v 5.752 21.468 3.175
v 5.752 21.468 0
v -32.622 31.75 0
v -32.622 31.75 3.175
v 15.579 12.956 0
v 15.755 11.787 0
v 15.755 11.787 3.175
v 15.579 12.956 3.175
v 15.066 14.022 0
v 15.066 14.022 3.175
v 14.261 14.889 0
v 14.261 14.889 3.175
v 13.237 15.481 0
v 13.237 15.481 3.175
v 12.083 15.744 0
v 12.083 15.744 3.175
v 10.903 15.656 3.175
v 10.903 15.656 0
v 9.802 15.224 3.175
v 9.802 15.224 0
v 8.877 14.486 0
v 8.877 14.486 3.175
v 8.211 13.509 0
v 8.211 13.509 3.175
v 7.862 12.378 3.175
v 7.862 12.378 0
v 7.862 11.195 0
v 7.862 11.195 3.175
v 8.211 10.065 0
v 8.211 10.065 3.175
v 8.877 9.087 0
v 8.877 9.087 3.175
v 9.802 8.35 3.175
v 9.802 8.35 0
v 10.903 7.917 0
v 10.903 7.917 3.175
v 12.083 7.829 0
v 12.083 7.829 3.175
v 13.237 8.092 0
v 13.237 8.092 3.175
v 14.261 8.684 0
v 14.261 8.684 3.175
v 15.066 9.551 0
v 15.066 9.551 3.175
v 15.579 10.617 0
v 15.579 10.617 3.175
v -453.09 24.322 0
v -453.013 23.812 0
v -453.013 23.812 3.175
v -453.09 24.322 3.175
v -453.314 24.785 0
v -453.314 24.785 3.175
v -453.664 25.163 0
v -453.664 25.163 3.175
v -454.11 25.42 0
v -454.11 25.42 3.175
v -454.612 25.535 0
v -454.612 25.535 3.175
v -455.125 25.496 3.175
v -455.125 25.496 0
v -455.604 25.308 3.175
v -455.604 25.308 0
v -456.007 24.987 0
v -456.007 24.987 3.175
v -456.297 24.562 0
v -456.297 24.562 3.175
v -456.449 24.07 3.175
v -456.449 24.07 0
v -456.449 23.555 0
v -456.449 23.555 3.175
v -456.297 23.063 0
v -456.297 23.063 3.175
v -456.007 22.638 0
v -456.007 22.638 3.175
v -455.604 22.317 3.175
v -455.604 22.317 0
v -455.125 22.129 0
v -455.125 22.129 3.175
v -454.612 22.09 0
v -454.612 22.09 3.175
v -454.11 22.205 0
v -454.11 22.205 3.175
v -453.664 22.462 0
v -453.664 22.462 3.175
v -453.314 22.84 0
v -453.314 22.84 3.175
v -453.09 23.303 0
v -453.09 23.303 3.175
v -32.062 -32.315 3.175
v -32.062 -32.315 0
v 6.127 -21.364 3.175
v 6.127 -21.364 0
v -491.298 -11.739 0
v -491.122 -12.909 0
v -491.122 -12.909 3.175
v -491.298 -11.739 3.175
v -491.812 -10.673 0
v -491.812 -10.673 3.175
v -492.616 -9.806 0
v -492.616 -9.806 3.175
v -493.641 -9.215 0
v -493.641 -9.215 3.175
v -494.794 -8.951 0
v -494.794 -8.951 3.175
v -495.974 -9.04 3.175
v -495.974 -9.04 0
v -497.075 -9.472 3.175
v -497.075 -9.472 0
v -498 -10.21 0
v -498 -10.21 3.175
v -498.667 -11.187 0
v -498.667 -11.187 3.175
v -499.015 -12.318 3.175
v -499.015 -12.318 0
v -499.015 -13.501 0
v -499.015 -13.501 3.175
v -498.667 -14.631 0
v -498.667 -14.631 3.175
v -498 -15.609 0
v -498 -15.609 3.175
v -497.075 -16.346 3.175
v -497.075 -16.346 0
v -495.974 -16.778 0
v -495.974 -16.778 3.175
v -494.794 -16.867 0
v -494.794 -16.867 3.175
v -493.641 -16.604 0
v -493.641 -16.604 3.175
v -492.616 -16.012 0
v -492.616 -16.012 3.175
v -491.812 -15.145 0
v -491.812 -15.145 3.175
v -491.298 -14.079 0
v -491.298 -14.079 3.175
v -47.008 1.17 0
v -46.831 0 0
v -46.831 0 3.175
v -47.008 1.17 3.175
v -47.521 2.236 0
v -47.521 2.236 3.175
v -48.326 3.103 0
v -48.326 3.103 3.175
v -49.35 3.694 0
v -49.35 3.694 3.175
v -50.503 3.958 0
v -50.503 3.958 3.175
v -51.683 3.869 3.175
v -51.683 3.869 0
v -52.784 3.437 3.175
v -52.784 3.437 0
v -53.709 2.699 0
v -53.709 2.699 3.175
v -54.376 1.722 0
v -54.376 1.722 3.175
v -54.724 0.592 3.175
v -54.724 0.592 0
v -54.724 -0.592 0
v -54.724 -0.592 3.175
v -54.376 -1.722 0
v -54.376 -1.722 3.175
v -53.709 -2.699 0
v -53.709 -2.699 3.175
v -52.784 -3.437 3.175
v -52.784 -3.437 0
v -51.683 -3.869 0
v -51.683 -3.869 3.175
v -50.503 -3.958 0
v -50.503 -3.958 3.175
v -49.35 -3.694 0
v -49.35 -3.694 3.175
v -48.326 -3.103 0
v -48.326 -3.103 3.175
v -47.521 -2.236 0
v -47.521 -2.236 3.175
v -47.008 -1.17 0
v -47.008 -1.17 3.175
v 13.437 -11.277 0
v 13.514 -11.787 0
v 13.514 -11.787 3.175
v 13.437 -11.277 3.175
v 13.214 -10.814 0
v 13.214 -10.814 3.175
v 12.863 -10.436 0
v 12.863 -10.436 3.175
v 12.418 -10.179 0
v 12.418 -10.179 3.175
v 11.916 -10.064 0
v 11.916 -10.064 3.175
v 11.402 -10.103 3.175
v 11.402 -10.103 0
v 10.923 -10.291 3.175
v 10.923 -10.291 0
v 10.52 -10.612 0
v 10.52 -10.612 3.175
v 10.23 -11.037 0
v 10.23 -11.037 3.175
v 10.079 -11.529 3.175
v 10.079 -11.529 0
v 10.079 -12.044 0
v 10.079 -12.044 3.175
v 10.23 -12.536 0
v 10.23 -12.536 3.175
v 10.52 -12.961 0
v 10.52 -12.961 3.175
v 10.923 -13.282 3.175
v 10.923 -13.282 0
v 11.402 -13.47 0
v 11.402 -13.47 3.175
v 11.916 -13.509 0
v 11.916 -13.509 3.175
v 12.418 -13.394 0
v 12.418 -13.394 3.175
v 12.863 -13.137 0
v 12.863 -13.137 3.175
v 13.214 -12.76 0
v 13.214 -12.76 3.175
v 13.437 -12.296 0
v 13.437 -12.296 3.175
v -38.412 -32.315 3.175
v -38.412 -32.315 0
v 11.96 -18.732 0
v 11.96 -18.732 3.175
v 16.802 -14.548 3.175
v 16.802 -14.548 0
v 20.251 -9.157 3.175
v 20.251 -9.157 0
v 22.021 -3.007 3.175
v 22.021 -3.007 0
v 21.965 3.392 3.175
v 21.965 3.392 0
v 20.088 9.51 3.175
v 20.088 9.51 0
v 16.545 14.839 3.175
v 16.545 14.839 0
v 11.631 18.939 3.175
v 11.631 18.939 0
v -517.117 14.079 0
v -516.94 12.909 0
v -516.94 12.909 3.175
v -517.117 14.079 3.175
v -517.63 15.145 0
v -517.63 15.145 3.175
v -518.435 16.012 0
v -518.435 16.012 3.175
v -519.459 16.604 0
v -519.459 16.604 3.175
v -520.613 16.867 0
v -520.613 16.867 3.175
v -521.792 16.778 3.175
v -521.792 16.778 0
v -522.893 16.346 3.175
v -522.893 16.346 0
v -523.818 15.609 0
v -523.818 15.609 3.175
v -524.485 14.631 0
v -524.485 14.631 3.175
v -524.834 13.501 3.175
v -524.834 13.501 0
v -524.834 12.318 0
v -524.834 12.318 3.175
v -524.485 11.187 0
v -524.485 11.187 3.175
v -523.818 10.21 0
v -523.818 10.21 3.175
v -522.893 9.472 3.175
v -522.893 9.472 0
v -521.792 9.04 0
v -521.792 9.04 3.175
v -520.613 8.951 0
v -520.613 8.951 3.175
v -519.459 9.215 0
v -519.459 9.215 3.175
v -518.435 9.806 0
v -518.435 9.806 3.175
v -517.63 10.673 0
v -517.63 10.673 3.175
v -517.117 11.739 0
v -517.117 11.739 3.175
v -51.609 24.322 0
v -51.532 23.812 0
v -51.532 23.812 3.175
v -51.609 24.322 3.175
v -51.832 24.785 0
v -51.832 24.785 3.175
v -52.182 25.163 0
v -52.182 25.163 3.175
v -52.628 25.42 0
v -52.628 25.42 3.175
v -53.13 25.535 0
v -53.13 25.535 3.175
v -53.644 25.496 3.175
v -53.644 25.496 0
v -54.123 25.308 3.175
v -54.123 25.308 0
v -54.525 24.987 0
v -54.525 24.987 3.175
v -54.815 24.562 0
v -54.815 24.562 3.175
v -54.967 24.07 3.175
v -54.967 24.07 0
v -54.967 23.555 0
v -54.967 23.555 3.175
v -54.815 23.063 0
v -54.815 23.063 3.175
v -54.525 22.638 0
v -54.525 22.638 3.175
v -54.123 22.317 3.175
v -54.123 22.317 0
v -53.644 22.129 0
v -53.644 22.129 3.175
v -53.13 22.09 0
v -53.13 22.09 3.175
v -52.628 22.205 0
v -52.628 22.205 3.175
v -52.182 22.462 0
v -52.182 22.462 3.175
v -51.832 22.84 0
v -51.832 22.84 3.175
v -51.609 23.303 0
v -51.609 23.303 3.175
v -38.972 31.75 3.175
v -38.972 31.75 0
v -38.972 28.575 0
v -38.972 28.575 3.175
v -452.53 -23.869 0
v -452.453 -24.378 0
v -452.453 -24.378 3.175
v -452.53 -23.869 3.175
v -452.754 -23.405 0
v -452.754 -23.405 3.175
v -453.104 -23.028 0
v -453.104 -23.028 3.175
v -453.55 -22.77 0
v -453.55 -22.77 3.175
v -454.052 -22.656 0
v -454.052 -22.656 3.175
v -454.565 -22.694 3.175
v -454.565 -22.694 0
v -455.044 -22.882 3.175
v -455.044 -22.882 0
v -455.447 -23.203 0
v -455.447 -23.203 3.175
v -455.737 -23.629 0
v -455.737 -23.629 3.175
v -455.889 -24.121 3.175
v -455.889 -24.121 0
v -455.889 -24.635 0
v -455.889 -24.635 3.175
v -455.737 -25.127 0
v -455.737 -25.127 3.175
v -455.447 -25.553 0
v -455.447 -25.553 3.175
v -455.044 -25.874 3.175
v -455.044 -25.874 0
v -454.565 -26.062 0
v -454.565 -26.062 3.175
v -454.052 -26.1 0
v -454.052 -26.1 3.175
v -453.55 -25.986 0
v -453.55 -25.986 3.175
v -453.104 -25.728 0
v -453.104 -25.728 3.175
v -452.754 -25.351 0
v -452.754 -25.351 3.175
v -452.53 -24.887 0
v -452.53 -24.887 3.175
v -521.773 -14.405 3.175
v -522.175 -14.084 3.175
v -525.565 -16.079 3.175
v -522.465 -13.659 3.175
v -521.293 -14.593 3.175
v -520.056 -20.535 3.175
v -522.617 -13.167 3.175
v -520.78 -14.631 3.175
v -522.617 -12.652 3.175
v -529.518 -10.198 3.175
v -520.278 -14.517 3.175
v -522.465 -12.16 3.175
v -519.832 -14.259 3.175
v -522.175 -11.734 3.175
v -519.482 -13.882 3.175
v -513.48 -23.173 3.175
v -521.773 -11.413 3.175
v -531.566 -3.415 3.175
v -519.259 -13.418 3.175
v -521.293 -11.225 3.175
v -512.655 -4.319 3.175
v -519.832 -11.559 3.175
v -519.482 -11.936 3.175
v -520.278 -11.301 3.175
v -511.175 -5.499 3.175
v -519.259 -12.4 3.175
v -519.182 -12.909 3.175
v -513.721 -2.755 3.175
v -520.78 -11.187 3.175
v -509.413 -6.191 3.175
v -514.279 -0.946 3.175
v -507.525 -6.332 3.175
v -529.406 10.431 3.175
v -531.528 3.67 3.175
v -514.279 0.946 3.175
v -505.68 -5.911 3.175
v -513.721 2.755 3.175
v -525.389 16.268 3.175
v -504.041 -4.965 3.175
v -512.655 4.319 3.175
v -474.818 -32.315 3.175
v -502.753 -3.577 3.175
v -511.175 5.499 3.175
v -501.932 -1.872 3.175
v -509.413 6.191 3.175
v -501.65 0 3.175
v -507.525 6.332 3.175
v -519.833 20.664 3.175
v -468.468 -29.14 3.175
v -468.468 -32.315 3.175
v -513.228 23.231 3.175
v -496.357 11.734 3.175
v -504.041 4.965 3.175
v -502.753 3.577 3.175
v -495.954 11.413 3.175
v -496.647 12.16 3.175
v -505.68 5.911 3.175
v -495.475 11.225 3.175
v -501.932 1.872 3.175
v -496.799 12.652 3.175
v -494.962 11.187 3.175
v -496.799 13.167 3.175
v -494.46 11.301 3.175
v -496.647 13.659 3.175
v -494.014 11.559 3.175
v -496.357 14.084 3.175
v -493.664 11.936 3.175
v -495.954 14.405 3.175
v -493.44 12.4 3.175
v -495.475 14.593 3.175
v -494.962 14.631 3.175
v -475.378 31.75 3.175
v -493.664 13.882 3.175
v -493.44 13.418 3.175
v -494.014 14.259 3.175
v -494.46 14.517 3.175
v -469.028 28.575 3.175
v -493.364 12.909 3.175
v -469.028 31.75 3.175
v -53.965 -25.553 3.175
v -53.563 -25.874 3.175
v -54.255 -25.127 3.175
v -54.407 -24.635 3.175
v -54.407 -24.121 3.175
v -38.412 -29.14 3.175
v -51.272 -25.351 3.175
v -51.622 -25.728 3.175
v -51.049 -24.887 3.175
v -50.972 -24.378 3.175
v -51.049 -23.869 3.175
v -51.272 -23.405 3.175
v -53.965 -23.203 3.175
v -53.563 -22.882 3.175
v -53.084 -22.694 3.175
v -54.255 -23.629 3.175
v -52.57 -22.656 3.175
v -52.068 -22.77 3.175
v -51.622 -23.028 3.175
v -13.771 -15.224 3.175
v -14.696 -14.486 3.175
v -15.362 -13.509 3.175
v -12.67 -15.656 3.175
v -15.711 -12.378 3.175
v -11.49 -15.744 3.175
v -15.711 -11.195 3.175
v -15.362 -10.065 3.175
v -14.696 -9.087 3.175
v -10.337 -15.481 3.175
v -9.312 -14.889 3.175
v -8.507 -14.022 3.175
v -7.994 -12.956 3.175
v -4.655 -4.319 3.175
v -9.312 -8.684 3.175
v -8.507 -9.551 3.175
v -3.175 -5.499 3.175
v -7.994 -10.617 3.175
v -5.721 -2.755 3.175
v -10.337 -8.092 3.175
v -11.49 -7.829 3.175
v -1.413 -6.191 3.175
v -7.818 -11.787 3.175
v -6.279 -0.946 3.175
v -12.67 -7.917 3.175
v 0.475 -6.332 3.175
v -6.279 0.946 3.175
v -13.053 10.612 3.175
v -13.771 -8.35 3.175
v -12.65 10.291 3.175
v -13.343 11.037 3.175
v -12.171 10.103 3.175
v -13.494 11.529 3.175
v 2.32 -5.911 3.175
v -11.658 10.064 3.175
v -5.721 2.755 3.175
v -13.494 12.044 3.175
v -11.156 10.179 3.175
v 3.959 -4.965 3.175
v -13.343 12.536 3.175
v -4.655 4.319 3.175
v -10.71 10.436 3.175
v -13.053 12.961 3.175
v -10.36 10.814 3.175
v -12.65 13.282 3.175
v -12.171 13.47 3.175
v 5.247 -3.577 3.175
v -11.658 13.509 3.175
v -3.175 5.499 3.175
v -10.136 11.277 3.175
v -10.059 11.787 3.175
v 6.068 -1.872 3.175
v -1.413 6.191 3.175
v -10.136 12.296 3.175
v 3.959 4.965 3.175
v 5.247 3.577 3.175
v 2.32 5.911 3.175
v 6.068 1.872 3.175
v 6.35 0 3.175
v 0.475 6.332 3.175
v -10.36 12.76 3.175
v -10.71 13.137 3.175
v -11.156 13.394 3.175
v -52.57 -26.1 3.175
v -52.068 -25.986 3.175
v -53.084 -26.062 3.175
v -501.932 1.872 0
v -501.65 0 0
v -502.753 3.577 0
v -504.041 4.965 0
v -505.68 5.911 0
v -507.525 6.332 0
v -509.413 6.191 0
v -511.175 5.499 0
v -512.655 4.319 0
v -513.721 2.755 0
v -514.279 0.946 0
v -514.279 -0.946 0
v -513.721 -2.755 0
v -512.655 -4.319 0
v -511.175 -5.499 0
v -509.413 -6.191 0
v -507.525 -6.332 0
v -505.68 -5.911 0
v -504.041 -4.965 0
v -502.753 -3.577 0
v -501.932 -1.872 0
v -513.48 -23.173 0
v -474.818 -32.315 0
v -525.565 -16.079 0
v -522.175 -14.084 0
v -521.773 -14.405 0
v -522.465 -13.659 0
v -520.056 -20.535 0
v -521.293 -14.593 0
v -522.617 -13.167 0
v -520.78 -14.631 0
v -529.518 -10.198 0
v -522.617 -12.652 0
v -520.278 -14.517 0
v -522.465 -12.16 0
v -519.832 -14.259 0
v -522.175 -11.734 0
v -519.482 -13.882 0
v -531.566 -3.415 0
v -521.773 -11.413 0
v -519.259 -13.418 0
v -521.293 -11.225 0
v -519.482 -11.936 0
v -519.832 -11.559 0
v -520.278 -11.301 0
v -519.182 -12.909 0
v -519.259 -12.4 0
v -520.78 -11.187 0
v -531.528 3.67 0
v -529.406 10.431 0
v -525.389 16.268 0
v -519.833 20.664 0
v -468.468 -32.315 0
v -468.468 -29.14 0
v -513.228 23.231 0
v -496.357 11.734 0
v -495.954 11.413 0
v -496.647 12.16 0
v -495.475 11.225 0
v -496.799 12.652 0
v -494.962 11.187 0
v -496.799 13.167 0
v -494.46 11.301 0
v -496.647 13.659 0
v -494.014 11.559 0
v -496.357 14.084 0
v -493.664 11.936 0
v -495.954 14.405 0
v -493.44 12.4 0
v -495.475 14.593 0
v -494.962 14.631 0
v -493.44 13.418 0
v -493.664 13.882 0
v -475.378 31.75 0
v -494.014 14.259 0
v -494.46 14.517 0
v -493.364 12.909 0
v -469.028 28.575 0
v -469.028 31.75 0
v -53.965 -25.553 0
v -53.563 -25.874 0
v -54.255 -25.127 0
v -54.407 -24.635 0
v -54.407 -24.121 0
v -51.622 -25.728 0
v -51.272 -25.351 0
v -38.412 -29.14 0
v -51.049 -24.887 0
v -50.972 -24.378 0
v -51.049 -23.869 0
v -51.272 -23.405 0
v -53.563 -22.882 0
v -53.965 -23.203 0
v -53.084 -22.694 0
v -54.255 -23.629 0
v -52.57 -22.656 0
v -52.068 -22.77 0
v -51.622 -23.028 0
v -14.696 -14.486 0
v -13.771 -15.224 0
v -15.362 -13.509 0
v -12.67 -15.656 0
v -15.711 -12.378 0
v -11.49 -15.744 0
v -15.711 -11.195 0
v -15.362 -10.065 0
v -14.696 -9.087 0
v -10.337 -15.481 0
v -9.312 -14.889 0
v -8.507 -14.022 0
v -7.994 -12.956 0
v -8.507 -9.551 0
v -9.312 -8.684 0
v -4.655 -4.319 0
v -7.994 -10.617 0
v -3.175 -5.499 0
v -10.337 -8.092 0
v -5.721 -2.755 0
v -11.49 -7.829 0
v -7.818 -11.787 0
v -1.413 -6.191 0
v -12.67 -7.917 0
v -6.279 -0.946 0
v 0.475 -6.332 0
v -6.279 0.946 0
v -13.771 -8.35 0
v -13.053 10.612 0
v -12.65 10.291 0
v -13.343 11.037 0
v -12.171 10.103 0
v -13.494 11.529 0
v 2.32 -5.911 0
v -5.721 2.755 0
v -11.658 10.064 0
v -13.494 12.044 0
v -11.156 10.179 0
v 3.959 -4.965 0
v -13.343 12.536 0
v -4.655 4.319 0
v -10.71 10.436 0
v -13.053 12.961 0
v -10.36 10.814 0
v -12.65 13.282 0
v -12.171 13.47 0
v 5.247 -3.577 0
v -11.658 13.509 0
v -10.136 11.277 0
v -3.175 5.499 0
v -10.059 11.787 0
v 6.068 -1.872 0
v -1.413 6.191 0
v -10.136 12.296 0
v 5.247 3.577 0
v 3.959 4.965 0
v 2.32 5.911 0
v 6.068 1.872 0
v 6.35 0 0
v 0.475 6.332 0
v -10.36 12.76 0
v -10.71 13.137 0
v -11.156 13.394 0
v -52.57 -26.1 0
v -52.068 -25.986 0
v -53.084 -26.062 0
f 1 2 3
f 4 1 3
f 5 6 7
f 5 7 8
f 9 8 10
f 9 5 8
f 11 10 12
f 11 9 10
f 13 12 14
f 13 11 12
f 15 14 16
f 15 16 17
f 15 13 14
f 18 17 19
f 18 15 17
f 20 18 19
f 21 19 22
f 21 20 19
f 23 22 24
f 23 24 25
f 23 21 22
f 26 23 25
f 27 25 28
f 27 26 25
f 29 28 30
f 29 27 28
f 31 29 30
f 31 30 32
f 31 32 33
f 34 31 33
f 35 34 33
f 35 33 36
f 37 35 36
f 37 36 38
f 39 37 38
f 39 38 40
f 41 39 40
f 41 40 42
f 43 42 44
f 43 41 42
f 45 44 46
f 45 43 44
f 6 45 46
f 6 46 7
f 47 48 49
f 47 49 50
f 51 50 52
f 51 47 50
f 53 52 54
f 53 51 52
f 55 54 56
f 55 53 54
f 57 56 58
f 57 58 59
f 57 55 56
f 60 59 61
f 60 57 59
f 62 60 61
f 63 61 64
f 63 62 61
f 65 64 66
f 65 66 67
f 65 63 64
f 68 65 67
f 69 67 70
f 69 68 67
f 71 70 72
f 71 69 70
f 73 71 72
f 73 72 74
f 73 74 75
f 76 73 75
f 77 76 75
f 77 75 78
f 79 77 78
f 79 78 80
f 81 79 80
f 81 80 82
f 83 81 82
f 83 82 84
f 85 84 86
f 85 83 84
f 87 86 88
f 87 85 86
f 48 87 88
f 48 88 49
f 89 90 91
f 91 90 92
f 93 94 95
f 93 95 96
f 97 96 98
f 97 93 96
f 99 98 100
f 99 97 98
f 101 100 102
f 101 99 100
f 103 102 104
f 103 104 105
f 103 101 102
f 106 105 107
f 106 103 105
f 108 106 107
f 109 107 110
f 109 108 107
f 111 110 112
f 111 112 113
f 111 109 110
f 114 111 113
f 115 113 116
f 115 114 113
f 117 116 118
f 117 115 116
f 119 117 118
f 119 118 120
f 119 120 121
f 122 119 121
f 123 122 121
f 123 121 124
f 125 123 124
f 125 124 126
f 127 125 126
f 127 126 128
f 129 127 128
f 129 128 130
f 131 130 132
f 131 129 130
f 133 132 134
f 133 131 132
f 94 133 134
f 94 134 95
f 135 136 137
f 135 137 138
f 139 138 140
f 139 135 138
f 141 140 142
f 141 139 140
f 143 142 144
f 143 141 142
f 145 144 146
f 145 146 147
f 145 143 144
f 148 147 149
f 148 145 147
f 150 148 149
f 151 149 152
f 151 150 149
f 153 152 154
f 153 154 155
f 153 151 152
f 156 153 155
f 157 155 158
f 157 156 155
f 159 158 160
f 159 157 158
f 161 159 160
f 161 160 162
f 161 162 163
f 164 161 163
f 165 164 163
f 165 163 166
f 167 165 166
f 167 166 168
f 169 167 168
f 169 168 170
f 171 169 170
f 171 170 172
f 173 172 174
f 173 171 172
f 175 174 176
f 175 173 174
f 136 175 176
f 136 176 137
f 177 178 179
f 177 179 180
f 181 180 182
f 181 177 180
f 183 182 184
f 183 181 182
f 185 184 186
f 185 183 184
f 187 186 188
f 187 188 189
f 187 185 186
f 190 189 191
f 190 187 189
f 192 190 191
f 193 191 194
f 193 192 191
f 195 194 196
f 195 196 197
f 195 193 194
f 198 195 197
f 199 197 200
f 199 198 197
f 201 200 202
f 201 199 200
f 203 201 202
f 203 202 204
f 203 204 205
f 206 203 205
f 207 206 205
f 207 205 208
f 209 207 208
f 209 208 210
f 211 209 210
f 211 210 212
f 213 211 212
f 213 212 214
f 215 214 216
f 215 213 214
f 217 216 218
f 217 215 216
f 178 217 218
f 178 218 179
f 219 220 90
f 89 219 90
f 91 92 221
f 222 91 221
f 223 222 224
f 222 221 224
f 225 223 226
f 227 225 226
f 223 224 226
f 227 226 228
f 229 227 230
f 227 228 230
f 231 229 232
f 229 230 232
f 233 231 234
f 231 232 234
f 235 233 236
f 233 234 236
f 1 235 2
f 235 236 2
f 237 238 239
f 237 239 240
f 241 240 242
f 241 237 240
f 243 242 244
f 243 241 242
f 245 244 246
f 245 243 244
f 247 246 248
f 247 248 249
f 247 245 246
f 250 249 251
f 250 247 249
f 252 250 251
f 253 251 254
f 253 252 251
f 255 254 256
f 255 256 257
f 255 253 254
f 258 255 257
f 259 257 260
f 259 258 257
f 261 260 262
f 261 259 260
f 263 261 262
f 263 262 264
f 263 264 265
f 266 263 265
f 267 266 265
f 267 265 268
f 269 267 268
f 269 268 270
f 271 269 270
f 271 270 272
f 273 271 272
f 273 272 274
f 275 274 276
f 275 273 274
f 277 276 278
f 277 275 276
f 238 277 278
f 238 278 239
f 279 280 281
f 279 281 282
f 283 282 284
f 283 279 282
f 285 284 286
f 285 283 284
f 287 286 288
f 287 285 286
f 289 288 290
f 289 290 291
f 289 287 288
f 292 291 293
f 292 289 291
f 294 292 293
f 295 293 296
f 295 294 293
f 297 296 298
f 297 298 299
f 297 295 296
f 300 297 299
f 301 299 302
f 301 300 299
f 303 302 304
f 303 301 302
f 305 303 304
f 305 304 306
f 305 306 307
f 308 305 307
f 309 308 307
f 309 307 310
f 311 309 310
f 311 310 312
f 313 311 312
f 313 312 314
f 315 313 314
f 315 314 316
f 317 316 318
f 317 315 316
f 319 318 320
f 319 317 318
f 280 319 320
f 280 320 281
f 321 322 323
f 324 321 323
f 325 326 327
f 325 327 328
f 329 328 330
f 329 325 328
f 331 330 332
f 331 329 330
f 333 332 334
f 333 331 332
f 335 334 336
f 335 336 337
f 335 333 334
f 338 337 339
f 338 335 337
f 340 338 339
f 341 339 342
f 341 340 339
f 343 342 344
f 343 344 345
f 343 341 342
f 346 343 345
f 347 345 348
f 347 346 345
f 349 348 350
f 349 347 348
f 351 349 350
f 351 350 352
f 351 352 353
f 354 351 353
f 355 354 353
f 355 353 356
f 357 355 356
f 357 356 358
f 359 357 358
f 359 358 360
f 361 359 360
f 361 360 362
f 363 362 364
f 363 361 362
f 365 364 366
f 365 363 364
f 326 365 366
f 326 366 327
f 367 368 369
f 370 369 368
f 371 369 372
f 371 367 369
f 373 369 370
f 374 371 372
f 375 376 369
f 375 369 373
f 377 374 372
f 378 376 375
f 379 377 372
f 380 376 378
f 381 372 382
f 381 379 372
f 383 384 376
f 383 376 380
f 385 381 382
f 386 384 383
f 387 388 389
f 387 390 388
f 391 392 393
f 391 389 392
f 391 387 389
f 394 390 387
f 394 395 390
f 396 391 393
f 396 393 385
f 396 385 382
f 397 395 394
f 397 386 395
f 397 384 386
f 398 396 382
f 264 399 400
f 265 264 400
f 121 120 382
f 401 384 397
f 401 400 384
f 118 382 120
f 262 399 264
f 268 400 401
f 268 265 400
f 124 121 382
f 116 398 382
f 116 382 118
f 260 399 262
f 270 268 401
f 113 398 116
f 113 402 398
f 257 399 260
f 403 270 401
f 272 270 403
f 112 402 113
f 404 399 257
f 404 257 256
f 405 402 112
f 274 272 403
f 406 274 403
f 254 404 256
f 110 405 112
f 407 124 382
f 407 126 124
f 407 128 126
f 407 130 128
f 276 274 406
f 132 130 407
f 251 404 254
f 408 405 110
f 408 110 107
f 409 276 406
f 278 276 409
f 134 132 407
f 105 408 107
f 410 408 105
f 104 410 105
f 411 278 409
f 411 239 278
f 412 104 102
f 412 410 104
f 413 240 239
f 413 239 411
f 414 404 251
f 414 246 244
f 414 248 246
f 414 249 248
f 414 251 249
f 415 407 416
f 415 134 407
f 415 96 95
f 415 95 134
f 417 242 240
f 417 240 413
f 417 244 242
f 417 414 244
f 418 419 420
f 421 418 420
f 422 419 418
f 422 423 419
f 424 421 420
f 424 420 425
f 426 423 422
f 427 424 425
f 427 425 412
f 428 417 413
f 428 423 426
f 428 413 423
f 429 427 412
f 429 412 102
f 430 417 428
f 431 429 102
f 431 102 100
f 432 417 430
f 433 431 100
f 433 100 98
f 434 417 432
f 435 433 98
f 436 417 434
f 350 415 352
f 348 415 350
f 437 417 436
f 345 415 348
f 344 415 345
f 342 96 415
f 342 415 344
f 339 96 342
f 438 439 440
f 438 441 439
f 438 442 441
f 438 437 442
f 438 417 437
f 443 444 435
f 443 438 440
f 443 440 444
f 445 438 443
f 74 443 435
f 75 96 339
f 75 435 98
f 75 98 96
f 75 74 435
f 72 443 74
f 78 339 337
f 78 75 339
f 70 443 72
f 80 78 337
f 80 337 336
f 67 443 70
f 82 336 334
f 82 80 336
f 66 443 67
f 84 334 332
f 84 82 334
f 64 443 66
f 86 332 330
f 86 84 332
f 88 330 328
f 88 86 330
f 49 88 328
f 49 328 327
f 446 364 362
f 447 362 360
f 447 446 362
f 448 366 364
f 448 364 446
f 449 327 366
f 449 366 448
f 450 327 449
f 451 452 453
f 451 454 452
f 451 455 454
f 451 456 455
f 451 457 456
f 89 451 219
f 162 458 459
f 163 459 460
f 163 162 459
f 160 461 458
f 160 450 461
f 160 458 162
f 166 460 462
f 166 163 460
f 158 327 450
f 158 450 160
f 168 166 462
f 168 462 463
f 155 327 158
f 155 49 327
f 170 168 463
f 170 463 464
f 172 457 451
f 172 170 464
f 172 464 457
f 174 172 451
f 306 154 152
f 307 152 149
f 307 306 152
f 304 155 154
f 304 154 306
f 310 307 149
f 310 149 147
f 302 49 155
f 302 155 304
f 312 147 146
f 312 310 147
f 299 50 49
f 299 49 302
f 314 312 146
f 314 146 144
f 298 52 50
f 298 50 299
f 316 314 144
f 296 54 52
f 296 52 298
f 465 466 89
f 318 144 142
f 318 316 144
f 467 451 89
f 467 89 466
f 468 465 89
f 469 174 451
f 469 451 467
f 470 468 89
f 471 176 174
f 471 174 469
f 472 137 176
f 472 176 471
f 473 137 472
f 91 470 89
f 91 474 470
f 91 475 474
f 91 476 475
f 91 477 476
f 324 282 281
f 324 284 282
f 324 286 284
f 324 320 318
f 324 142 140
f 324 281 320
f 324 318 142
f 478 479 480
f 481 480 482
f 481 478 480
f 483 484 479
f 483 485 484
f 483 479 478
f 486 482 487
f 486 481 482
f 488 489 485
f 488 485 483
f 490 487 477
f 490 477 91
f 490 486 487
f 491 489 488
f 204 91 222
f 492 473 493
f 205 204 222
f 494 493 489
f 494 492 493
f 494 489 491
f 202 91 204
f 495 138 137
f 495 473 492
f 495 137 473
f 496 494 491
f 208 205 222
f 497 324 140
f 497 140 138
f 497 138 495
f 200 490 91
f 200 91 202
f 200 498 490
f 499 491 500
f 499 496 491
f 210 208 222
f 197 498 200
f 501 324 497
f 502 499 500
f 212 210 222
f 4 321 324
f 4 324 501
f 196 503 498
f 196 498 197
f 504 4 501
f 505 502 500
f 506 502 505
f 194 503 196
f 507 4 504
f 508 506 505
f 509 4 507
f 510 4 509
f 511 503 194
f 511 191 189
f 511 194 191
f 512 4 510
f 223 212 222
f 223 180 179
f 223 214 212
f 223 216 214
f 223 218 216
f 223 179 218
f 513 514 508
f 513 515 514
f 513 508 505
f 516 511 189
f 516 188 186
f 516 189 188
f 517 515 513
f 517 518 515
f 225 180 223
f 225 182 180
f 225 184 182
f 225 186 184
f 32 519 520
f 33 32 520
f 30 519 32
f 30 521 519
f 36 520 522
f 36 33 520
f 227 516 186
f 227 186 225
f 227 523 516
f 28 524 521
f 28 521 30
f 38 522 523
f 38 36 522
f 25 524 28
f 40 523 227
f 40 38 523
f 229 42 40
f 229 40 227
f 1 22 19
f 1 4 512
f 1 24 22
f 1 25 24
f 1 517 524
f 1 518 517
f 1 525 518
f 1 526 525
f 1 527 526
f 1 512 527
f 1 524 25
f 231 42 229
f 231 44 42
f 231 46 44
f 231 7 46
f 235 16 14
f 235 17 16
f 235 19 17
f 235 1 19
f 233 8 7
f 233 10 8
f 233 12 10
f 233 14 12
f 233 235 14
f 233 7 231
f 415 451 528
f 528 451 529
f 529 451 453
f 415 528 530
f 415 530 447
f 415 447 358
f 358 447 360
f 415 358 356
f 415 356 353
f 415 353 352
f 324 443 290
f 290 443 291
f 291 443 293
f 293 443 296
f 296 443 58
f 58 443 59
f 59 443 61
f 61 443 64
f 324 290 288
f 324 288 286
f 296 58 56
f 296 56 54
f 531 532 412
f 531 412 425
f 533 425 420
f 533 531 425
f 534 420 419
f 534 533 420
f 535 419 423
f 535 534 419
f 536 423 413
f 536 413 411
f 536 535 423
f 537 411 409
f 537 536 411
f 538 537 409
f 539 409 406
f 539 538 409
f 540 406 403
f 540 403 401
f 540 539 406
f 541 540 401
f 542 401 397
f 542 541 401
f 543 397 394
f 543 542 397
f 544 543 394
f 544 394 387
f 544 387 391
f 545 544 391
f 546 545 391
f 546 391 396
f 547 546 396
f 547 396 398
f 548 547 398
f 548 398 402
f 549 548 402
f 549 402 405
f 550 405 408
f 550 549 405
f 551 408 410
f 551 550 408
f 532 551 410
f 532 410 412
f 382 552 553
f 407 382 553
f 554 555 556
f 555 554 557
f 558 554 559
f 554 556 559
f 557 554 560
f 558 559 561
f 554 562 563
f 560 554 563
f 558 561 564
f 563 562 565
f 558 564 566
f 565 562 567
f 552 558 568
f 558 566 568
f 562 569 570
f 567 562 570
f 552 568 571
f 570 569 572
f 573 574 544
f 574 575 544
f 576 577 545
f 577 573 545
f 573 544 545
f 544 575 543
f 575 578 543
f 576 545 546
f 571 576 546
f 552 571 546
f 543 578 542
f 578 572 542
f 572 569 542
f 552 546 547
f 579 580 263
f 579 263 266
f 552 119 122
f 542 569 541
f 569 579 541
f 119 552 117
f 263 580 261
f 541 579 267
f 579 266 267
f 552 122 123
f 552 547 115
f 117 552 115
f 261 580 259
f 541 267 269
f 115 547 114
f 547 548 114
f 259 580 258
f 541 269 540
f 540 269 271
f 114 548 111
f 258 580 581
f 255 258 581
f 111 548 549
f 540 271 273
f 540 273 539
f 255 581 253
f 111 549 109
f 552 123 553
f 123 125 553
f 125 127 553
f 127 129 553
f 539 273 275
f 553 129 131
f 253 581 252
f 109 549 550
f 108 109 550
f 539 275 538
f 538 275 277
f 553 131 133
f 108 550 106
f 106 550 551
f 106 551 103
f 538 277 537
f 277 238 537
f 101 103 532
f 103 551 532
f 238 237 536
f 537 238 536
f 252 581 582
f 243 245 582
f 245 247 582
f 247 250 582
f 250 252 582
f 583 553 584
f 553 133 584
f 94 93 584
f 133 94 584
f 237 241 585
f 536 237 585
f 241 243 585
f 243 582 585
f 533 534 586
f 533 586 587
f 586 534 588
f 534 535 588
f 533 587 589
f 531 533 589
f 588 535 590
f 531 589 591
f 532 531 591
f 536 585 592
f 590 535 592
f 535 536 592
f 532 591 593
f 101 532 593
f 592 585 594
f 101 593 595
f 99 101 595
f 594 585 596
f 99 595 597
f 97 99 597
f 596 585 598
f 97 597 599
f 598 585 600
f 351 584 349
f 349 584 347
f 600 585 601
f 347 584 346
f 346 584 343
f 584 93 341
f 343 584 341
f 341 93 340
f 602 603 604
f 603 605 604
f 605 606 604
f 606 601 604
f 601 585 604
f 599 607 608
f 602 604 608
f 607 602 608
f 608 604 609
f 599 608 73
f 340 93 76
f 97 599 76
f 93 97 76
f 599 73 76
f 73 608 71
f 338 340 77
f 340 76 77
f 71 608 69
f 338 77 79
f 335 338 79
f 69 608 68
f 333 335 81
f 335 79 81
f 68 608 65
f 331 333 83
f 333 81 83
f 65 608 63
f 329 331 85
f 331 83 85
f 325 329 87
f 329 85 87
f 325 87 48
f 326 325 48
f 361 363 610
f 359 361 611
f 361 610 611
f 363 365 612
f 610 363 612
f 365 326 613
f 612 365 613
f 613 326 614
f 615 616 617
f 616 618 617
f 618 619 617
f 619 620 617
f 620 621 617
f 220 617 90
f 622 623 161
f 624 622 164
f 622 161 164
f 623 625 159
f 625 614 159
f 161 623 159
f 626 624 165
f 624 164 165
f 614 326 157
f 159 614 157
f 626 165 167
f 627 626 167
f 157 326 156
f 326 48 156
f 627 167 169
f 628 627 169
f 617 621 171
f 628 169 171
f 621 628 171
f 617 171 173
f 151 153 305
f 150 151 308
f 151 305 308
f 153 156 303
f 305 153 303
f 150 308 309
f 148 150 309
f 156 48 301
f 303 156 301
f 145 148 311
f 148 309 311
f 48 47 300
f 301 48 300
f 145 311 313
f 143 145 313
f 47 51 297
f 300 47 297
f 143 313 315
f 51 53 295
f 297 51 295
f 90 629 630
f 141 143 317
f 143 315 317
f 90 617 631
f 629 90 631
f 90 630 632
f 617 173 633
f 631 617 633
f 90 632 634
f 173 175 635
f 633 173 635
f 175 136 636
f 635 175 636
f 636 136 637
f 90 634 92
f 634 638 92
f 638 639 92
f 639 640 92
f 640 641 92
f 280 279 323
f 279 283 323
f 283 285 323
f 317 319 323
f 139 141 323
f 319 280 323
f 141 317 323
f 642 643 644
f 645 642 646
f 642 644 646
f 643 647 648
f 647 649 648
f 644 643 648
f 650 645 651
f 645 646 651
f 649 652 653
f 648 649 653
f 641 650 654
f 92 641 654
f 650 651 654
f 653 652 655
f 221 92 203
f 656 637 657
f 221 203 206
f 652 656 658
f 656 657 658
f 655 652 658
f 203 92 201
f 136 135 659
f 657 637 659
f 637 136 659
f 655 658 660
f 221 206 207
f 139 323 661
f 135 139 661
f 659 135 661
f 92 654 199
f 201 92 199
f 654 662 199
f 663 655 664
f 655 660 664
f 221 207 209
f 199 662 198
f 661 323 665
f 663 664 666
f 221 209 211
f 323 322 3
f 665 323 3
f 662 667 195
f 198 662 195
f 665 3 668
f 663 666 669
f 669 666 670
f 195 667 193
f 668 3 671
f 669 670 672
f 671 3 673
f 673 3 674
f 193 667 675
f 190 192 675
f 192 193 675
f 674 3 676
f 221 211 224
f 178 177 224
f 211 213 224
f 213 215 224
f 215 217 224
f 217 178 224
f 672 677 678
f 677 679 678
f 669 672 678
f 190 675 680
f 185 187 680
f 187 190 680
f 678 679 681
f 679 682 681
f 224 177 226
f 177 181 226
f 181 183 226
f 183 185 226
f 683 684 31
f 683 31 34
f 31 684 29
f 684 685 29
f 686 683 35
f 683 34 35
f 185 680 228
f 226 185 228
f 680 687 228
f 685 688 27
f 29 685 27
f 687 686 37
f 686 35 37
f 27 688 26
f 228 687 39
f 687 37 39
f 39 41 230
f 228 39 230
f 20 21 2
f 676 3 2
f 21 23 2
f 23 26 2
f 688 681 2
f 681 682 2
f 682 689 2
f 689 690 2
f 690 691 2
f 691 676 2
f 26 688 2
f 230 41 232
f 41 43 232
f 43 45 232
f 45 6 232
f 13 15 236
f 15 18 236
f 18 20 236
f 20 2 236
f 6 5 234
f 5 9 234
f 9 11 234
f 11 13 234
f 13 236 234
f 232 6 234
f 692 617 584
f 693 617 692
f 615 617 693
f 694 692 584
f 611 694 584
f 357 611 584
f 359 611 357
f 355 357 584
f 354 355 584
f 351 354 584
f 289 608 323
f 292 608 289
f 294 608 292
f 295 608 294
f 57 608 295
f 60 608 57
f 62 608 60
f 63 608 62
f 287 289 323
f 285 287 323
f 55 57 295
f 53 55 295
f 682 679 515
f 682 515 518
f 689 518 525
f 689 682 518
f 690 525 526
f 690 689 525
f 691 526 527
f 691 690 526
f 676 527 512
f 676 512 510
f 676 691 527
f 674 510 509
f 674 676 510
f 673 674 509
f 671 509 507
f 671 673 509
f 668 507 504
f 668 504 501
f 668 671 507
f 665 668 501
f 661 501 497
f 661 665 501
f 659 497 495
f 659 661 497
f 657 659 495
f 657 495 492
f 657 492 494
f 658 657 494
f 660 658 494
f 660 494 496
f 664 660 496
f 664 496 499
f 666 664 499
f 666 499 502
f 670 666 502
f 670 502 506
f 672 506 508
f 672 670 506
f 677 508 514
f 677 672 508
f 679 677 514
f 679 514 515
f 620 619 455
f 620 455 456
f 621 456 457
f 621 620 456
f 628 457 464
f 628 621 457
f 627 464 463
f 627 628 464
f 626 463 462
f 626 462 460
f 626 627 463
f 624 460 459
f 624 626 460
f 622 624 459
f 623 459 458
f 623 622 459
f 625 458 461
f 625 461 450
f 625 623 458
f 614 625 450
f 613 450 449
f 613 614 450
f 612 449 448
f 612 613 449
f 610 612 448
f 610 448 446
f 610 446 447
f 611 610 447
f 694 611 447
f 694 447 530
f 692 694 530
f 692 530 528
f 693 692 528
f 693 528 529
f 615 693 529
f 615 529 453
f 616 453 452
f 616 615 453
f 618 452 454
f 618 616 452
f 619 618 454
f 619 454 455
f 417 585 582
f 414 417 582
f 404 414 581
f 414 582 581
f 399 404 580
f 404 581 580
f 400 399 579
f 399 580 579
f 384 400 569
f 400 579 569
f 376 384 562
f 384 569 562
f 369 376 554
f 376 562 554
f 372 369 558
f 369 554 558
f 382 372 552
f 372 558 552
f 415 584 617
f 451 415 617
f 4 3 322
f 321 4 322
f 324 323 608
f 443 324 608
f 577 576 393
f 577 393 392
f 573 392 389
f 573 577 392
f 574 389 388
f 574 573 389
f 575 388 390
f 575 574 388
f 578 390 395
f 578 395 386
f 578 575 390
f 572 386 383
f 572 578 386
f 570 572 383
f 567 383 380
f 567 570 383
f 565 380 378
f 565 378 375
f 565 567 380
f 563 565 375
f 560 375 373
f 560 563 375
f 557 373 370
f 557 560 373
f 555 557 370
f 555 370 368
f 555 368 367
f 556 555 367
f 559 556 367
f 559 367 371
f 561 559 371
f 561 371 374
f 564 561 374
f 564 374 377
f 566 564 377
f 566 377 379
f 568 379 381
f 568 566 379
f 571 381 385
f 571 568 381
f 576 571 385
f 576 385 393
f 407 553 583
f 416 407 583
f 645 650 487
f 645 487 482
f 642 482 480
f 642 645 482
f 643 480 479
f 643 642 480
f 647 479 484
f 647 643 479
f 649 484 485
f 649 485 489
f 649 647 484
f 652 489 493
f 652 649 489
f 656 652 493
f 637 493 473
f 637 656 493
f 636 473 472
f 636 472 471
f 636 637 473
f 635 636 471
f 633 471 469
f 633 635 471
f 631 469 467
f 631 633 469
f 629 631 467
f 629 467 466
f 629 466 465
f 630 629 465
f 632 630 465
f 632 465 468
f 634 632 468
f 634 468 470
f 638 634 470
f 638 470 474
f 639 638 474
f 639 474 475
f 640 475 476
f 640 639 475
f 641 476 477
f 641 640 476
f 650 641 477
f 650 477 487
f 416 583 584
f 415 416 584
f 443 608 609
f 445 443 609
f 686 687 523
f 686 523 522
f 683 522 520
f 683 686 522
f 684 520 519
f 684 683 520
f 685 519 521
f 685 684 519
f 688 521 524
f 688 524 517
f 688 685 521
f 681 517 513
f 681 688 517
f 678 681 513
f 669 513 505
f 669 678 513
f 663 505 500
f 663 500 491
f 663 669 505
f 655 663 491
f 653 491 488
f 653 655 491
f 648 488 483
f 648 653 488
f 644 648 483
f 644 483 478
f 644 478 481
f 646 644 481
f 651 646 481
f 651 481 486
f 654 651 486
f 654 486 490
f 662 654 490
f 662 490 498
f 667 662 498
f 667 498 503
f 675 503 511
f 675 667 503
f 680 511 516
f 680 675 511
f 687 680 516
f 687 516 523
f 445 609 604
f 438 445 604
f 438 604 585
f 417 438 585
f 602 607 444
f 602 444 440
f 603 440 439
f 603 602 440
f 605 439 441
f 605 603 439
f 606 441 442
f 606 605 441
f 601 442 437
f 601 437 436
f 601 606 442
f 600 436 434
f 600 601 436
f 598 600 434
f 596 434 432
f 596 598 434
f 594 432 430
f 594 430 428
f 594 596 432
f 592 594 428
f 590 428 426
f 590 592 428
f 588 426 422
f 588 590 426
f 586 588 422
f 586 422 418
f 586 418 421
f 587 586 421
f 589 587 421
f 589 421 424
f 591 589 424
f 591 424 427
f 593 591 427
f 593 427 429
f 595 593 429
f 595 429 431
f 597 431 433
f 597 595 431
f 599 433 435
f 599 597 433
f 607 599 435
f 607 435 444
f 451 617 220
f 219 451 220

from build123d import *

# Parameters (mm, degrees)
F0_R     = 1.7272
F0_R_2   = 3.96875
F0_R_3   = 6.35
F1_DEPTH = 3.175


with BuildPart() as f1:
    # F0 (on Top) → F1 (new body)
    with BuildSketch(Plane.XY):
        with BuildLine():
            Line((-475.378193, 31.75), (-513.228467, 23.231407))
            ThreePointArc((-513.228467, 23.231407), (-531.812151, 0.128904), (-513.479674, -23.17344))
            Line((-513.479674, -23.17344), (-474.818103, -32.315493))
            Line((-474.818103, -32.315493), (-468.468103, -32.315493))
            Line((-468.468103, -32.315493), (-468.468103, -29.140493))
            Line((-468.468103, -29.140493), (-38.411718, -29.140493))
            Line((-38.411718, -29.140493), (-38.411718, -32.315493))
            Line((-38.411718, -32.315493), (-32.061718, -32.315493))
            Line((-32.061718, -32.315493), (6.126706, -21.36385))
            ThreePointArc((6.126706, -21.36385), (22.224151, 0.194294), (5.752253, 21.467701))
            Line((5.752253, 21.467701), (-32.621807, 31.75))
            Line((-32.621807, 31.75), (-38.971807, 31.75))
            Line((-38.971807, 31.75), (-38.971807, 28.575))
            Line((-38.971807, 28.575), (-469.028193, 28.575))
            Line((-469.028193, 28.575), (-469.028193, 31.75))
            Line((-469.028193, 31.75), (-475.378193, 31.75))
        make_face()
        with Locations((-454.180603, -24.377993)):
            Circle(F0_R, mode=Mode.SUBTRACT)
        with Locations((-520.909118, -12.909118)):
            Circle(F0_R, mode=Mode.SUBTRACT)
        with Locations((-495.090882, -12.909118)):
            Circle(F0_R_2, mode=Mode.SUBTRACT)
        with Locations((-52.699218, -24.377993)):
            Circle(F0_R, mode=Mode.SUBTRACT)
        with Locations((-11.786586, -11.786586)):
            Circle(F0_R_2, mode=Mode.SUBTRACT)
        with Locations((11.786586, -11.786586)):
            Circle(F0_R, mode=Mode.SUBTRACT)
        with Locations((-508, 0)):
            Circle(F0_R_3, mode=Mode.SUBTRACT)
        with Locations((-520.909118, 12.909118)):
            Circle(F0_R_2, mode=Mode.SUBTRACT)
        with Locations((-495.090882, 12.909118)):
            Circle(F0_R, mode=Mode.SUBTRACT)
        with Locations((-454.740693, 23.8125)):
            Circle(F0_R, mode=Mode.SUBTRACT)
        with Locations((-50.8, 0)):
            Circle(F0_R_2, mode=Mode.SUBTRACT)
        Circle(F0_R_3, mode=Mode.SUBTRACT)
        with Locations((-11.786586, 11.786586)):
            Circle(F0_R, mode=Mode.SUBTRACT)
        with Locations((11.786586, 11.786586)):
            Circle(F0_R_2, mode=Mode.SUBTRACT)
        with Locations((-53.259307, 23.8125)):
            Circle(F0_R, mode=Mode.SUBTRACT)
    extrude(amount=F1_DEPTH)


solid = f1.part
